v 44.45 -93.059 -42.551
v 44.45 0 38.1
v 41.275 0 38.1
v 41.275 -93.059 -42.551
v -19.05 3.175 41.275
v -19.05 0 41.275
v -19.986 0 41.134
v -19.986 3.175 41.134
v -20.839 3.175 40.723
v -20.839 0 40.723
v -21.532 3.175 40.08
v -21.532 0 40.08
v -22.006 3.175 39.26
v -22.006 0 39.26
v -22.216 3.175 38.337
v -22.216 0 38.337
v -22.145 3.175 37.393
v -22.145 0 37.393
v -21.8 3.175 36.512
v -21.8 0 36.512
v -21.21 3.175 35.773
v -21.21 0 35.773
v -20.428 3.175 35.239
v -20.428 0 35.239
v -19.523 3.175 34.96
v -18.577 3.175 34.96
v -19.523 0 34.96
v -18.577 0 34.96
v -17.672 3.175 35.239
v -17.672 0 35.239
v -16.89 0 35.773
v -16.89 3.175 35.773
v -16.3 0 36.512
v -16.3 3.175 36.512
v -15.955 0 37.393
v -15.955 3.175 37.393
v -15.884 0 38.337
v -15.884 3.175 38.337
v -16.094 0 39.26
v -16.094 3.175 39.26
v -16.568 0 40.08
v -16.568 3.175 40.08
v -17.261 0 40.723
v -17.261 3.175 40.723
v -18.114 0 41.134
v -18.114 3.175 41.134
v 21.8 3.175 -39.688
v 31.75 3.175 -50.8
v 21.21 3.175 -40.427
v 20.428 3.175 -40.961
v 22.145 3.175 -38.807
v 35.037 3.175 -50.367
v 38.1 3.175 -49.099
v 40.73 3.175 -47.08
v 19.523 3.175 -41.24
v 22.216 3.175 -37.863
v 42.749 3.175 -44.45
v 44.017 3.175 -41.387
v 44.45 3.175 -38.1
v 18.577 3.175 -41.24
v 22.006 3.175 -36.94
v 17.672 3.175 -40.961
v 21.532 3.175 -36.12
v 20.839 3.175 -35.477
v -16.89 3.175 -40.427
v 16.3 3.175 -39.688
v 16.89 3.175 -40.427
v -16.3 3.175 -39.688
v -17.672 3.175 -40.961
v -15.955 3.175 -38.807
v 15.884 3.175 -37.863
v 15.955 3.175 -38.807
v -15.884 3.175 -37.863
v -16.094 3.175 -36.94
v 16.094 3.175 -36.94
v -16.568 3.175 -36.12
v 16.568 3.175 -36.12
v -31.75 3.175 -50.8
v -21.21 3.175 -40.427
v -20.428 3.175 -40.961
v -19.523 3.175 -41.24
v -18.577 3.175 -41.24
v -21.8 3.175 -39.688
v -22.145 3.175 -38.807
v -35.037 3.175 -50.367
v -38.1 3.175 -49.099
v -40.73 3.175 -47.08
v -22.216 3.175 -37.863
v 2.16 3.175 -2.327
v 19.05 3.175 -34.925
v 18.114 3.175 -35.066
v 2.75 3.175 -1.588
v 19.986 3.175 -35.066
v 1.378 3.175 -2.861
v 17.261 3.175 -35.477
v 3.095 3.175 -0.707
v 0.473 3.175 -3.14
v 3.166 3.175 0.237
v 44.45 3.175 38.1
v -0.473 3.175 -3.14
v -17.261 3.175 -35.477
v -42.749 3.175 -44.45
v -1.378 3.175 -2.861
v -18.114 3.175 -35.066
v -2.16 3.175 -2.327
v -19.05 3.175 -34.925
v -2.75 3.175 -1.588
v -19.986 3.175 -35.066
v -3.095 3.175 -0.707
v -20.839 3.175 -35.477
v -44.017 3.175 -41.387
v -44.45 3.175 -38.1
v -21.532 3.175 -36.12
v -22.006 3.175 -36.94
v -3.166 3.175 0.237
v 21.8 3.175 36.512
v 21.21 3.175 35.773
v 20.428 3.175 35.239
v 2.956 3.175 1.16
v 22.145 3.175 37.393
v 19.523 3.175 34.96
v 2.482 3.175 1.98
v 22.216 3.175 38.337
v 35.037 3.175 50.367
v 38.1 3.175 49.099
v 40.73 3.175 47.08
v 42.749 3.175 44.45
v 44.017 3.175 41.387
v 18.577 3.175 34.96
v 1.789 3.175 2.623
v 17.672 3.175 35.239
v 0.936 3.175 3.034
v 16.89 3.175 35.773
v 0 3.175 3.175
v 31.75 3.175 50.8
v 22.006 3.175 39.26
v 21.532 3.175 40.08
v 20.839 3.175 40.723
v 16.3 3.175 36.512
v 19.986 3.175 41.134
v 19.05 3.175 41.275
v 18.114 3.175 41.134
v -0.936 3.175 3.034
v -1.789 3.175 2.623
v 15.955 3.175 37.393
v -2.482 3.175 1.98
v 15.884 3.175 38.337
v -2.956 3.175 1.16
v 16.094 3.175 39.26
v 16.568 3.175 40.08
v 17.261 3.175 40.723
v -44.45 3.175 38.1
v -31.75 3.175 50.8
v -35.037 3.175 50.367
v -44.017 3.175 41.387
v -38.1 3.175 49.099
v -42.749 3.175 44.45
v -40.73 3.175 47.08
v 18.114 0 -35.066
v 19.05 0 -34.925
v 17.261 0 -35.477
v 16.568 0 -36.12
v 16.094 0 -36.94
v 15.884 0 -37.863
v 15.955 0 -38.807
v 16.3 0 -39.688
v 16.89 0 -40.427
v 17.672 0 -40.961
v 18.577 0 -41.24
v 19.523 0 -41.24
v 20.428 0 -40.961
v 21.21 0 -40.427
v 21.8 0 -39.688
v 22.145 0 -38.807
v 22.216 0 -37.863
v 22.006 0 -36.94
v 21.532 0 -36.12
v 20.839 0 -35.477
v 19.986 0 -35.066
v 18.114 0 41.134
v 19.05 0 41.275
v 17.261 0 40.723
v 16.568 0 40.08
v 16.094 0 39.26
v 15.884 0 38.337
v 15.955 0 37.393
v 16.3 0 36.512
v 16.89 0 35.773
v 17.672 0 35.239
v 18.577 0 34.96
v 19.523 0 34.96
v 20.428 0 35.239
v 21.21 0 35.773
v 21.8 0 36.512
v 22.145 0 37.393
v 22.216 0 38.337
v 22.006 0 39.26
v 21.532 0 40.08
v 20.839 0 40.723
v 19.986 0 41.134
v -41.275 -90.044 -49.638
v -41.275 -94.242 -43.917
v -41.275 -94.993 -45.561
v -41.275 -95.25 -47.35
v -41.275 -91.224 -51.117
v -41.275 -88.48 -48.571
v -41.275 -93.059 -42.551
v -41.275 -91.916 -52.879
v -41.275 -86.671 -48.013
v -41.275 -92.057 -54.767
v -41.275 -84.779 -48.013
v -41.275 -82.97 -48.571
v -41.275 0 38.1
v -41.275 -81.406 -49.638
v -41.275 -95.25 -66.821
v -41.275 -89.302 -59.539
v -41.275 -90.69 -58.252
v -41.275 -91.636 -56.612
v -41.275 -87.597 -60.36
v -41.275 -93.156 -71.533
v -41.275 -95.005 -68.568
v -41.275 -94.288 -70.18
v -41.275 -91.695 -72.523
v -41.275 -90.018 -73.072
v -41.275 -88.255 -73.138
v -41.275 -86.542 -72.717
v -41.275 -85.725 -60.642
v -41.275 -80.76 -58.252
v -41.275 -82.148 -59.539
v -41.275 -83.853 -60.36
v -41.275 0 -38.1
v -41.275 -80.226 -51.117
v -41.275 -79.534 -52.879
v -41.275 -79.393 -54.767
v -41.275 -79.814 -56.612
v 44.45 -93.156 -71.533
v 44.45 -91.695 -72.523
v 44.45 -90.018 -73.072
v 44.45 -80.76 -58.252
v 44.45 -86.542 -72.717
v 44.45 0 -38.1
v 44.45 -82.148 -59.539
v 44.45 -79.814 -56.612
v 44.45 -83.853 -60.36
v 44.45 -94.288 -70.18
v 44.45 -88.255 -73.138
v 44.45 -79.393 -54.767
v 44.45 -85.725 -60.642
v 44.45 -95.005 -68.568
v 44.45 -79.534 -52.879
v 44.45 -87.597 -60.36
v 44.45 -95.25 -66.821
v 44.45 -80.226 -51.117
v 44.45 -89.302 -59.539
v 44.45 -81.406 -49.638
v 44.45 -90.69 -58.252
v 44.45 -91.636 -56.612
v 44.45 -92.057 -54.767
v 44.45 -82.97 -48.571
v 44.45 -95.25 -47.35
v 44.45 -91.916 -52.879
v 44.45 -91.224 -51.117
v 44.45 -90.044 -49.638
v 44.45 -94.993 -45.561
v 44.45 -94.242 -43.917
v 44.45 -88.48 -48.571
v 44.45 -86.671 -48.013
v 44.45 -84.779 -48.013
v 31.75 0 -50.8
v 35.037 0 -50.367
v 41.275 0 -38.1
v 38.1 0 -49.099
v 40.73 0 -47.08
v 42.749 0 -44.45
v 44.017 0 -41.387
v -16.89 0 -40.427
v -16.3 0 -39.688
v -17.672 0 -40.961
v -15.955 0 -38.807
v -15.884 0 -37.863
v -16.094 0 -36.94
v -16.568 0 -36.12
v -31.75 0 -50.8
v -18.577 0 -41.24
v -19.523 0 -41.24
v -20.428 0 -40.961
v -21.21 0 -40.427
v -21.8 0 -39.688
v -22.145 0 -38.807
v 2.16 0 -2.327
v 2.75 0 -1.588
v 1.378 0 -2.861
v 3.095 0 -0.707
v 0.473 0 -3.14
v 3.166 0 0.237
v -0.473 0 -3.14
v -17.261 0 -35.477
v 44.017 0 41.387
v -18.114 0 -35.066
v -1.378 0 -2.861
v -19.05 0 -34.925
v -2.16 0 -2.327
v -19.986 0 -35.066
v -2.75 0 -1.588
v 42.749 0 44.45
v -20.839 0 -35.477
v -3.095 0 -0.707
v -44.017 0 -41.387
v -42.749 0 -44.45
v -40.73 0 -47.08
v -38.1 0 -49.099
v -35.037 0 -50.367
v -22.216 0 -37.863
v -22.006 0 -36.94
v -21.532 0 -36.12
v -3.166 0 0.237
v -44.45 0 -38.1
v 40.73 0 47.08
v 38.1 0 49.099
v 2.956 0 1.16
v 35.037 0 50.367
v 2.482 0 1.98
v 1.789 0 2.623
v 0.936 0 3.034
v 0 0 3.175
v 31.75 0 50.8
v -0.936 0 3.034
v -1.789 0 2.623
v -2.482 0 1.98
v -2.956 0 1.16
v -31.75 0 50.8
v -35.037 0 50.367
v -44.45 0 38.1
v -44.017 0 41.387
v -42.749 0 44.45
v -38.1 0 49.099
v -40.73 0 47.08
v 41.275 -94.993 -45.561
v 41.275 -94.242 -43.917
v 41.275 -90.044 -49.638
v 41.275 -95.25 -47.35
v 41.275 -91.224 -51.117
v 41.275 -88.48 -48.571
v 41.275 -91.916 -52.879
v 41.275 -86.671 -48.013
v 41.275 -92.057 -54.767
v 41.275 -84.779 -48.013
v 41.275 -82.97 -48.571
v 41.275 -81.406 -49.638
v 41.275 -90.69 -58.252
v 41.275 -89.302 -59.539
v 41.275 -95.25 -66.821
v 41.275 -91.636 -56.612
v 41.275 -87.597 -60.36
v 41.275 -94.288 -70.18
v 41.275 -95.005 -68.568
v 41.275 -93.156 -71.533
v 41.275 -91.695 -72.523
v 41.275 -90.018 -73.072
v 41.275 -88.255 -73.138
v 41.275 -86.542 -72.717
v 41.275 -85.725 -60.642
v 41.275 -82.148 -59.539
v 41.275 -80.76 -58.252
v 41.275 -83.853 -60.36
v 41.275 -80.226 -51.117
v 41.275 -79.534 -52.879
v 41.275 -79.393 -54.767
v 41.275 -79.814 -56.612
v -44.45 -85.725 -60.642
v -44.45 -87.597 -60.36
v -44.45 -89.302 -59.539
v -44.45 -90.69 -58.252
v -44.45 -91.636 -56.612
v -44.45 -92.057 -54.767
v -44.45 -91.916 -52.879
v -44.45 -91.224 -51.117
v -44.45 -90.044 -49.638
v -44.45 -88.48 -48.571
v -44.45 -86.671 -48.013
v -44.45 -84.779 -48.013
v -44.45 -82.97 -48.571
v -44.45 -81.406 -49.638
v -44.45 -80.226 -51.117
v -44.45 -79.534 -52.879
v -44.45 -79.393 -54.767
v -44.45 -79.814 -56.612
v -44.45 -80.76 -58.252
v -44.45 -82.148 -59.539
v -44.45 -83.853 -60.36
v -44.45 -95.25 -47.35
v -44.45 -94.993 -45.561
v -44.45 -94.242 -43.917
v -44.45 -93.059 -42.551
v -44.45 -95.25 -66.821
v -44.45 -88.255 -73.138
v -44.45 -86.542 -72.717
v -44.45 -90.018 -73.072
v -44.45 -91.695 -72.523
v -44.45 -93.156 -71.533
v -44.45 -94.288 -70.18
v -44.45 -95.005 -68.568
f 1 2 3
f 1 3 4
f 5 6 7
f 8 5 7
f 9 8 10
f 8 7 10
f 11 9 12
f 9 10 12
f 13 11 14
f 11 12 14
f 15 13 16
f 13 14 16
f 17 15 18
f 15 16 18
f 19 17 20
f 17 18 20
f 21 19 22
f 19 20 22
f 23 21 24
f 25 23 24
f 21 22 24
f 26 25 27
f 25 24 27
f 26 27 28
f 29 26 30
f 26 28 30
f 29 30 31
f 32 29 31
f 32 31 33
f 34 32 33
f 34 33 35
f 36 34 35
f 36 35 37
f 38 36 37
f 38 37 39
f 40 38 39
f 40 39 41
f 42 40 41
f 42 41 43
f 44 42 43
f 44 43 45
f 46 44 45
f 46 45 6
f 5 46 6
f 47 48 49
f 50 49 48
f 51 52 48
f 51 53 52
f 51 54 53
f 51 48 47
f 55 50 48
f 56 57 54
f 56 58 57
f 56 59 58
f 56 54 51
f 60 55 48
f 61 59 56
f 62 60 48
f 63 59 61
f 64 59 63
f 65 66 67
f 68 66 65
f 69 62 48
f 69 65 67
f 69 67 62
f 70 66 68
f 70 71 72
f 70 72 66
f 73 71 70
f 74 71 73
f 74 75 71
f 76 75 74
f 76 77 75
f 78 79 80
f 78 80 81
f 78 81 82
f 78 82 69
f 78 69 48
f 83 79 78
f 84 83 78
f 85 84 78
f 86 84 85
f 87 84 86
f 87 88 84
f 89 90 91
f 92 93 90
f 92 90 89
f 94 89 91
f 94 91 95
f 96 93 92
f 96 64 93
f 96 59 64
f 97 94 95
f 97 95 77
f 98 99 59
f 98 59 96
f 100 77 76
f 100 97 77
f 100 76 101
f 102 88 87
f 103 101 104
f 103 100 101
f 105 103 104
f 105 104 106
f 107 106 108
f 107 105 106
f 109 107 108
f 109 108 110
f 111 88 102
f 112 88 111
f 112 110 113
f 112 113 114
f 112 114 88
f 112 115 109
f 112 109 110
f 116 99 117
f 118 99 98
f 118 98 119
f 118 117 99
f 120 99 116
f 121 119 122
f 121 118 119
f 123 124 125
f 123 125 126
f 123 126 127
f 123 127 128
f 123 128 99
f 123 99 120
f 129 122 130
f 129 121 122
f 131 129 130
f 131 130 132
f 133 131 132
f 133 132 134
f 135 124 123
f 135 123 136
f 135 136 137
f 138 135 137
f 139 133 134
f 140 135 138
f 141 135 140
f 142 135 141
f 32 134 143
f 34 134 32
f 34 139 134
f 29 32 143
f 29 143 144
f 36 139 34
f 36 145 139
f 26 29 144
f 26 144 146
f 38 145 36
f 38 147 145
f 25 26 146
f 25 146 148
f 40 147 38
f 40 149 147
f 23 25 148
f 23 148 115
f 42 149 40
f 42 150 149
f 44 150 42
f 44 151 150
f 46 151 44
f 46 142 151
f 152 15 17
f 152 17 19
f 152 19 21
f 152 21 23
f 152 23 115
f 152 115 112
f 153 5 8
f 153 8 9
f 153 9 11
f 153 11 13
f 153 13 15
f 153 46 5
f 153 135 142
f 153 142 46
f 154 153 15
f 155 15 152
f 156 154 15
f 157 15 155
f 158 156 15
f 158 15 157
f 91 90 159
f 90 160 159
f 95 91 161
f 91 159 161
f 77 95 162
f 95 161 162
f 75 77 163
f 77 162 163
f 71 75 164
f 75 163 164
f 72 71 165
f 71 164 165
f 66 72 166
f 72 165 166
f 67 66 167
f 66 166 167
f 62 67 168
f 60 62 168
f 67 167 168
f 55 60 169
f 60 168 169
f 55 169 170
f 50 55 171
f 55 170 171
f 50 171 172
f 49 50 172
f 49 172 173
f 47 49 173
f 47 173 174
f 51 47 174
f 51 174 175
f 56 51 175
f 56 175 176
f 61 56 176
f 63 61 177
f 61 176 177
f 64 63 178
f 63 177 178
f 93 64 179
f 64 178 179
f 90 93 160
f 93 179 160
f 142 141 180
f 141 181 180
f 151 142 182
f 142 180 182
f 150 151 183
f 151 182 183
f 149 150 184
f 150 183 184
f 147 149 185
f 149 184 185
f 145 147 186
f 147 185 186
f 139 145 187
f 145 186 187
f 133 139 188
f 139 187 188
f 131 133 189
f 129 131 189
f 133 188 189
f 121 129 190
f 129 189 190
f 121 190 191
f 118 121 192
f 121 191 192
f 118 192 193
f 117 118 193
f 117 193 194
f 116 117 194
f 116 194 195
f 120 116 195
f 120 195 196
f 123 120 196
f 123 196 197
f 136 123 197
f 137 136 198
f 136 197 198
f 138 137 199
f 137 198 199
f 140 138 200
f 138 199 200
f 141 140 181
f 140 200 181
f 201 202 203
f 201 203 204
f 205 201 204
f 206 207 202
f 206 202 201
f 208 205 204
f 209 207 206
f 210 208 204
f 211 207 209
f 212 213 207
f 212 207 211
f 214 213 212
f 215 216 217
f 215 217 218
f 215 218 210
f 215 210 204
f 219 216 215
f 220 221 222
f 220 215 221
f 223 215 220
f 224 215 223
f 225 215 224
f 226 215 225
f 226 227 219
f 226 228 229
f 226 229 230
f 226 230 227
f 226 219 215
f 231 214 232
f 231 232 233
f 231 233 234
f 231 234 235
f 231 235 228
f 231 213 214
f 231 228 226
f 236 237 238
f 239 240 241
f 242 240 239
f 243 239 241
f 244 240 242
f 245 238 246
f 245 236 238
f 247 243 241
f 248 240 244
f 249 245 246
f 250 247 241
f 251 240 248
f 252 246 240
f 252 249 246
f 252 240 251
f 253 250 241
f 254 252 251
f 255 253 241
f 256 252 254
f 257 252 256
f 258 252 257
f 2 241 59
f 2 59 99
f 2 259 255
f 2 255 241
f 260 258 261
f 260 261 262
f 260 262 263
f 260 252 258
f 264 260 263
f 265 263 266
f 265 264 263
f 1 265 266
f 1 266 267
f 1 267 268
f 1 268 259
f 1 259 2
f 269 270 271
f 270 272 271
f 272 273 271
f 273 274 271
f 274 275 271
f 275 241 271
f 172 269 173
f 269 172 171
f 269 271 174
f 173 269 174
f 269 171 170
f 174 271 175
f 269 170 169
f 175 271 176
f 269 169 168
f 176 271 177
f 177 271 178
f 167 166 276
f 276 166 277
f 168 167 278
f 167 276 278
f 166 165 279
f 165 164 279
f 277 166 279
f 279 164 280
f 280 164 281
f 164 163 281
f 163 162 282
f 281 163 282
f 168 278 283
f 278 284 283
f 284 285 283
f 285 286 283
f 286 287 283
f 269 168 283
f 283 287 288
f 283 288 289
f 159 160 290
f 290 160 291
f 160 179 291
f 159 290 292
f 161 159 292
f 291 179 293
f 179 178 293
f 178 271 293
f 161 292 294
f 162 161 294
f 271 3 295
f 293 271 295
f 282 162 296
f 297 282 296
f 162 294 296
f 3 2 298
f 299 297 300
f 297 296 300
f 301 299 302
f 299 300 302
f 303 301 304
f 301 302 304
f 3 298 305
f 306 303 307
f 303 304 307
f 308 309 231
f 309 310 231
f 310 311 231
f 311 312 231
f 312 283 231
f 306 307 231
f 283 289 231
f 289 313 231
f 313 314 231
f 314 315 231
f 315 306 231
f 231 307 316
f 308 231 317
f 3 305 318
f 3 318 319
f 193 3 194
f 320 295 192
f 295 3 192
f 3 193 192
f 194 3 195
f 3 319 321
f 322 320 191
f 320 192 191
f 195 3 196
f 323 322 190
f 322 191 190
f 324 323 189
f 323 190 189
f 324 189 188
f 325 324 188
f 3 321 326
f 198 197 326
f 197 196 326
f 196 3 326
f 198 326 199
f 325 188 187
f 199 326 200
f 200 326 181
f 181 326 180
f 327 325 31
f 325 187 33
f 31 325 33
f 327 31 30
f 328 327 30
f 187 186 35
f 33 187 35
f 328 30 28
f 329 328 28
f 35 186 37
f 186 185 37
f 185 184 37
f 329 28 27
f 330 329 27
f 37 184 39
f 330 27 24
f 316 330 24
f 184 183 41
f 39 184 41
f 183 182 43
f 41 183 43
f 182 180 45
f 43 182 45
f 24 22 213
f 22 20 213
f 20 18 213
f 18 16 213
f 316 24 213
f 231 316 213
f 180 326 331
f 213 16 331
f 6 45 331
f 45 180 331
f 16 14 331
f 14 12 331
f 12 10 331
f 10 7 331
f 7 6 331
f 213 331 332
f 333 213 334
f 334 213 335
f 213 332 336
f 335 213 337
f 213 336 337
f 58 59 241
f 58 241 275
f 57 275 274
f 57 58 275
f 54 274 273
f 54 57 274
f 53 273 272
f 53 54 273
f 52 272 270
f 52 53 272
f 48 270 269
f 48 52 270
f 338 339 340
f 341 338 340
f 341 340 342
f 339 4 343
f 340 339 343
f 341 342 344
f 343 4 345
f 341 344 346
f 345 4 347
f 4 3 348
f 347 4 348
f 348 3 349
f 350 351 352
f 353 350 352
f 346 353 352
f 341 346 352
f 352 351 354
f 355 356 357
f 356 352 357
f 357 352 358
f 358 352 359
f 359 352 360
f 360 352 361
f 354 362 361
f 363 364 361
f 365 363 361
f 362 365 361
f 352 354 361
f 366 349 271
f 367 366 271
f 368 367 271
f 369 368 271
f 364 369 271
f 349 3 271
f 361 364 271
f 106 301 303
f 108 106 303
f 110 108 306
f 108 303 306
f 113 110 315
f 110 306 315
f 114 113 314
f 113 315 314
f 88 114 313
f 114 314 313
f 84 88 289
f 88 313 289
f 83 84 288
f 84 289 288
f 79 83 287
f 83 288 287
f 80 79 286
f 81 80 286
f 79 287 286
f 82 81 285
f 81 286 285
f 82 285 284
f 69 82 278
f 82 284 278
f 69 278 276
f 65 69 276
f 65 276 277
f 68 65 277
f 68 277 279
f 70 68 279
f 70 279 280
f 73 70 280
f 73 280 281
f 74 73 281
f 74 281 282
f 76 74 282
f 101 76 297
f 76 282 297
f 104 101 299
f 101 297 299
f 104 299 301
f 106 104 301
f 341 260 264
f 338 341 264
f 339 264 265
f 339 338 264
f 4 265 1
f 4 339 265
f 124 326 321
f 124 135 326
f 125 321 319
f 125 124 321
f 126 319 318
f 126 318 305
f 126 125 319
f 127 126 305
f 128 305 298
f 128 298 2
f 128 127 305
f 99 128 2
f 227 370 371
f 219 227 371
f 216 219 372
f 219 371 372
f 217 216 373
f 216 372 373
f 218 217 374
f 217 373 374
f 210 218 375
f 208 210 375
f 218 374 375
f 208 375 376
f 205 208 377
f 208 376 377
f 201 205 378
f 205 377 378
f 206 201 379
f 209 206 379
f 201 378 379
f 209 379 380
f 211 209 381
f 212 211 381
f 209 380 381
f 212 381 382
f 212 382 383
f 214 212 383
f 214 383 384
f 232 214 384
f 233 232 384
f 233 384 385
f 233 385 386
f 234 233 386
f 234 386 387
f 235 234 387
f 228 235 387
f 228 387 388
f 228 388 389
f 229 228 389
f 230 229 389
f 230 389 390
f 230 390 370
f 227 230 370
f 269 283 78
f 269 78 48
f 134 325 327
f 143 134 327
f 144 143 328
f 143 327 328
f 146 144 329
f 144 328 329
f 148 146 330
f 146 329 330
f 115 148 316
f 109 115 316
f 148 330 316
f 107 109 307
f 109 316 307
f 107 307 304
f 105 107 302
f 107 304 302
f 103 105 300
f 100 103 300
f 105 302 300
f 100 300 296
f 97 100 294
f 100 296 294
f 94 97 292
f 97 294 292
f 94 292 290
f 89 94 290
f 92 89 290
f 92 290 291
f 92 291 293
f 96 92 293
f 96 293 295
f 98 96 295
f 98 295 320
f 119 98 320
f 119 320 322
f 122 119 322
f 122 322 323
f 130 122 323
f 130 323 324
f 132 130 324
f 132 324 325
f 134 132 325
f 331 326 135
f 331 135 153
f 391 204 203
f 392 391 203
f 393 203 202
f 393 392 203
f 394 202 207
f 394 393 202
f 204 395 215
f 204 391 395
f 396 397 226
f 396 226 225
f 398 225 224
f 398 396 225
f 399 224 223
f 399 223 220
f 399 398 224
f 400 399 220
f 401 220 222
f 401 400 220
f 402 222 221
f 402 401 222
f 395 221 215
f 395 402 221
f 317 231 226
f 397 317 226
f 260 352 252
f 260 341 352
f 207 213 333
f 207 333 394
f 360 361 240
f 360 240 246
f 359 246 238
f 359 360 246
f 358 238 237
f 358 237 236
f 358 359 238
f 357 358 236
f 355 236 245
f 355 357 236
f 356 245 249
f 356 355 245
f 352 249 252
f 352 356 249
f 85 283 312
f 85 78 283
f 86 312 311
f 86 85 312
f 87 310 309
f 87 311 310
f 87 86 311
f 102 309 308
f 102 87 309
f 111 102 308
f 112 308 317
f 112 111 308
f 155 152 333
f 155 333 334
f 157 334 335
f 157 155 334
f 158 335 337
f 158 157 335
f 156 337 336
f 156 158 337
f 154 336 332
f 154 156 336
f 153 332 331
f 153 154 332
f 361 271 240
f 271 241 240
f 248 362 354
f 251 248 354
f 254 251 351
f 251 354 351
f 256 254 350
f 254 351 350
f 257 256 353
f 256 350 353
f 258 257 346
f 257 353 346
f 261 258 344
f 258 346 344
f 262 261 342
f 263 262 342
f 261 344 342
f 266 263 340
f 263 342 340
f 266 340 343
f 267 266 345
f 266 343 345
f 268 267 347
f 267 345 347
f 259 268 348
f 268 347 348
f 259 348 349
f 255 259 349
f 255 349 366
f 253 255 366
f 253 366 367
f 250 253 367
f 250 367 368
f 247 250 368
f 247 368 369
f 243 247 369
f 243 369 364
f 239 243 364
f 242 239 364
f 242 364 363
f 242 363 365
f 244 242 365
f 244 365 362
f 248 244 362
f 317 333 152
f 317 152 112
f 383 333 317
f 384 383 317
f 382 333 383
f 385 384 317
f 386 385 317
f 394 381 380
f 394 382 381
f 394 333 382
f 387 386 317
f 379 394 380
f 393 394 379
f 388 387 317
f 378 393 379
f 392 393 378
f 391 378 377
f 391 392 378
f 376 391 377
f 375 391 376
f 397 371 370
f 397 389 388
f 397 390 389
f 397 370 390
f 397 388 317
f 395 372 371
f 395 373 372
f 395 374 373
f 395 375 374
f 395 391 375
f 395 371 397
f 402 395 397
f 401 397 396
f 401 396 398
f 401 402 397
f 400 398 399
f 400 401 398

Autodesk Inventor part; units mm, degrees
ref_plane "YZ Plane" through (0, 0, 0) normal (1, 0, 0) x (0, 1, 0)
ref_plane "XZ Plane" through (0, 0, 0) normal (0, 1, 0) x (-1, 0, 0)
ref_plane "XY Plane" through (0, 0, 0) normal (0, 0, 1) x (1, 0, 0)
sketch "Sketch2" plane through (0, 0, 0) normal (0, 1, 0) x (-1, 0, 0)
  line L0 (-44.45, 50.8) -> (44.45, 50.8)
  line L1 (44.45, 50.8) -> (44.45, -50.8)
  line L2 (44.45, -50.8) -> (-44.45, -50.8)
  line L3 (-44.45, -50.8) -> (-44.45, 50.8)
  point P0 (0, 0)
  dimension "d0" = 44.45
  dimension "d1" = 44.45
  dimension "d2" = 50.8
  dimension "d3" = 50.8
extrude "Extrusion1" add sketch "Sketch2" along normal blind 3.175
fillet "Fillet1" radius 12.7 4 edges at (44.45, 1.5875, 50.8) (-44.45, 1.5875, 50.8) (44.45, 1.5875, -50.8) (-44.45, 1.5875, -50.8)
sketch "Sketch3" plane through (0, 3.175, 0) normal (0, 1, 0) x (1, 0, 0)
  line L0 (-19.05, 38.1) -> (19.05, 38.1) construction
  line L1 (19.05, 38.1) -> (19.05, -38.1) construction
  line L2 (19.05, -38.1) -> (-19.05, -38.1) construction
  line L3 (-19.05, -38.1) -> (-19.05, 38.1) construction
  point P0 (0, 0)
  point P1 (0, 0)
  point P2 (-19.05, 0)
  point P3 (0, 38.1)
  dimension "d36" = 38.1
  dimension "d37" = 76.2
hole "Hole1" at (-19.05, 3.175, -38.1) at (19.05, 3.175, -38.1) at (19.05, 3.175, 38.1) at (-19.05, 3.175, 38.1) at (0, 3.175, 0) direction (0, -1, 0) diameter 6.35 end through all
sketch "Sketch4" plane through (0, 0, 0) normal (0, -1, 0) x (1, 0, 0)
  circle A0 centre (-19.05, 38.1) radius 3.175 projected
  line L0 (44.45, -38.1) -> (44.45, 38.1) projected
  line L1 (-44.45, 38.1) -> (-44.45, -38.1) projected
  line L2 (44.45, 38.1) -> (41.275, 38.1)
  line L3 (41.275, 38.1) -> (41.275, -88.9)
  line L4 (41.275, -88.9) -> (44.45, -88.9)
  line L5 (44.45, -88.9) -> (44.45, 38.1)
  line L6 (-44.45, 38.1) -> (-41.275, 38.1)
  line L7 (-41.275, 38.1) -> (-41.275, -88.9)
  line L8 (-41.275, -88.9) -> (-44.45, -88.9)
  line L9 (-44.45, -88.9) -> (-44.45, 38.1)
  dimension "d18" = 3.175
  dimension "d19" = 3.175
  dimension "d20" = 127
  dimension "d21" = 127
extrude "Extrusion2" add sketch "Sketch4" along normal blind 95.25 contours L5 L4 L3 L2 L0 | L6 L7 L8 L9 L1
sketch "Sketch5" plane through (44.45, 3.175, 38.1) normal (1, 0, 0) x (0, 0, -1)
  line L0 (0, -3.175) -> (0, -98.425) projected
  line L1 (0, -3.175) -> (82.55, -98.425)
  line L2 (76.2, -3.175) -> (114.3, -98.425)
  line L3 (0, -3.175) -> (0, -98.425)
  line L4 (82.55, -98.425) -> (0, -98.425)
  line L5 (0, -98.425) -> (127, -98.425) projected
  line L6 (127, -3.175) -> (76.2, -3.175) projected
  line L7 (76.2, 0) -> (76.2, -3.175) projected
  line L8 (127, -3.175) -> (127, -98.425) projected
  point P0 (38.1, -3.175)
  dimension "d39" = 31.75
  dimension "d40" = 12.7
extrude "Extrusion3" cut sketch "Sketch5" against normal blind 127
sketch "Sketch6" plane through (44.45, 3.175, 38.1) normal (1, 0, 0) x (0, 0, -1)
  line L0 (82.55, -98.425) -> (114.3, -98.425) projected
  line L1 (98.425, -98.425) -> (38.1, -3.175) construction
  point P0 (92.3925, -88.9)
  dimension "d41" = 9.525
hole "Hole2" at (44.45, -85.725, -54.2925) direction (-1, 0, 0) diameter 12.7 end through all
fillet "Fillet2" radius 6.35 4 edges at (42.8625, -95.25, -44.45) (-42.8625, -95.25, -44.45) (-42.8625, -95.25, -76.2) (42.8625, -95.25, -76.2)
equation "\"d1\" = d0"
equation "\"d3\" = d2"
equation "\"d4\" = metalThickness"
equation "\"d18\" = metalThickness"
equation "\"d19\" = metalThickness"
equation "\"d21\" = d20"
equation "\"metalThickness\" = 3.175"
properties part number "Rotation Caster Flange" material "Aluminum-6061"
